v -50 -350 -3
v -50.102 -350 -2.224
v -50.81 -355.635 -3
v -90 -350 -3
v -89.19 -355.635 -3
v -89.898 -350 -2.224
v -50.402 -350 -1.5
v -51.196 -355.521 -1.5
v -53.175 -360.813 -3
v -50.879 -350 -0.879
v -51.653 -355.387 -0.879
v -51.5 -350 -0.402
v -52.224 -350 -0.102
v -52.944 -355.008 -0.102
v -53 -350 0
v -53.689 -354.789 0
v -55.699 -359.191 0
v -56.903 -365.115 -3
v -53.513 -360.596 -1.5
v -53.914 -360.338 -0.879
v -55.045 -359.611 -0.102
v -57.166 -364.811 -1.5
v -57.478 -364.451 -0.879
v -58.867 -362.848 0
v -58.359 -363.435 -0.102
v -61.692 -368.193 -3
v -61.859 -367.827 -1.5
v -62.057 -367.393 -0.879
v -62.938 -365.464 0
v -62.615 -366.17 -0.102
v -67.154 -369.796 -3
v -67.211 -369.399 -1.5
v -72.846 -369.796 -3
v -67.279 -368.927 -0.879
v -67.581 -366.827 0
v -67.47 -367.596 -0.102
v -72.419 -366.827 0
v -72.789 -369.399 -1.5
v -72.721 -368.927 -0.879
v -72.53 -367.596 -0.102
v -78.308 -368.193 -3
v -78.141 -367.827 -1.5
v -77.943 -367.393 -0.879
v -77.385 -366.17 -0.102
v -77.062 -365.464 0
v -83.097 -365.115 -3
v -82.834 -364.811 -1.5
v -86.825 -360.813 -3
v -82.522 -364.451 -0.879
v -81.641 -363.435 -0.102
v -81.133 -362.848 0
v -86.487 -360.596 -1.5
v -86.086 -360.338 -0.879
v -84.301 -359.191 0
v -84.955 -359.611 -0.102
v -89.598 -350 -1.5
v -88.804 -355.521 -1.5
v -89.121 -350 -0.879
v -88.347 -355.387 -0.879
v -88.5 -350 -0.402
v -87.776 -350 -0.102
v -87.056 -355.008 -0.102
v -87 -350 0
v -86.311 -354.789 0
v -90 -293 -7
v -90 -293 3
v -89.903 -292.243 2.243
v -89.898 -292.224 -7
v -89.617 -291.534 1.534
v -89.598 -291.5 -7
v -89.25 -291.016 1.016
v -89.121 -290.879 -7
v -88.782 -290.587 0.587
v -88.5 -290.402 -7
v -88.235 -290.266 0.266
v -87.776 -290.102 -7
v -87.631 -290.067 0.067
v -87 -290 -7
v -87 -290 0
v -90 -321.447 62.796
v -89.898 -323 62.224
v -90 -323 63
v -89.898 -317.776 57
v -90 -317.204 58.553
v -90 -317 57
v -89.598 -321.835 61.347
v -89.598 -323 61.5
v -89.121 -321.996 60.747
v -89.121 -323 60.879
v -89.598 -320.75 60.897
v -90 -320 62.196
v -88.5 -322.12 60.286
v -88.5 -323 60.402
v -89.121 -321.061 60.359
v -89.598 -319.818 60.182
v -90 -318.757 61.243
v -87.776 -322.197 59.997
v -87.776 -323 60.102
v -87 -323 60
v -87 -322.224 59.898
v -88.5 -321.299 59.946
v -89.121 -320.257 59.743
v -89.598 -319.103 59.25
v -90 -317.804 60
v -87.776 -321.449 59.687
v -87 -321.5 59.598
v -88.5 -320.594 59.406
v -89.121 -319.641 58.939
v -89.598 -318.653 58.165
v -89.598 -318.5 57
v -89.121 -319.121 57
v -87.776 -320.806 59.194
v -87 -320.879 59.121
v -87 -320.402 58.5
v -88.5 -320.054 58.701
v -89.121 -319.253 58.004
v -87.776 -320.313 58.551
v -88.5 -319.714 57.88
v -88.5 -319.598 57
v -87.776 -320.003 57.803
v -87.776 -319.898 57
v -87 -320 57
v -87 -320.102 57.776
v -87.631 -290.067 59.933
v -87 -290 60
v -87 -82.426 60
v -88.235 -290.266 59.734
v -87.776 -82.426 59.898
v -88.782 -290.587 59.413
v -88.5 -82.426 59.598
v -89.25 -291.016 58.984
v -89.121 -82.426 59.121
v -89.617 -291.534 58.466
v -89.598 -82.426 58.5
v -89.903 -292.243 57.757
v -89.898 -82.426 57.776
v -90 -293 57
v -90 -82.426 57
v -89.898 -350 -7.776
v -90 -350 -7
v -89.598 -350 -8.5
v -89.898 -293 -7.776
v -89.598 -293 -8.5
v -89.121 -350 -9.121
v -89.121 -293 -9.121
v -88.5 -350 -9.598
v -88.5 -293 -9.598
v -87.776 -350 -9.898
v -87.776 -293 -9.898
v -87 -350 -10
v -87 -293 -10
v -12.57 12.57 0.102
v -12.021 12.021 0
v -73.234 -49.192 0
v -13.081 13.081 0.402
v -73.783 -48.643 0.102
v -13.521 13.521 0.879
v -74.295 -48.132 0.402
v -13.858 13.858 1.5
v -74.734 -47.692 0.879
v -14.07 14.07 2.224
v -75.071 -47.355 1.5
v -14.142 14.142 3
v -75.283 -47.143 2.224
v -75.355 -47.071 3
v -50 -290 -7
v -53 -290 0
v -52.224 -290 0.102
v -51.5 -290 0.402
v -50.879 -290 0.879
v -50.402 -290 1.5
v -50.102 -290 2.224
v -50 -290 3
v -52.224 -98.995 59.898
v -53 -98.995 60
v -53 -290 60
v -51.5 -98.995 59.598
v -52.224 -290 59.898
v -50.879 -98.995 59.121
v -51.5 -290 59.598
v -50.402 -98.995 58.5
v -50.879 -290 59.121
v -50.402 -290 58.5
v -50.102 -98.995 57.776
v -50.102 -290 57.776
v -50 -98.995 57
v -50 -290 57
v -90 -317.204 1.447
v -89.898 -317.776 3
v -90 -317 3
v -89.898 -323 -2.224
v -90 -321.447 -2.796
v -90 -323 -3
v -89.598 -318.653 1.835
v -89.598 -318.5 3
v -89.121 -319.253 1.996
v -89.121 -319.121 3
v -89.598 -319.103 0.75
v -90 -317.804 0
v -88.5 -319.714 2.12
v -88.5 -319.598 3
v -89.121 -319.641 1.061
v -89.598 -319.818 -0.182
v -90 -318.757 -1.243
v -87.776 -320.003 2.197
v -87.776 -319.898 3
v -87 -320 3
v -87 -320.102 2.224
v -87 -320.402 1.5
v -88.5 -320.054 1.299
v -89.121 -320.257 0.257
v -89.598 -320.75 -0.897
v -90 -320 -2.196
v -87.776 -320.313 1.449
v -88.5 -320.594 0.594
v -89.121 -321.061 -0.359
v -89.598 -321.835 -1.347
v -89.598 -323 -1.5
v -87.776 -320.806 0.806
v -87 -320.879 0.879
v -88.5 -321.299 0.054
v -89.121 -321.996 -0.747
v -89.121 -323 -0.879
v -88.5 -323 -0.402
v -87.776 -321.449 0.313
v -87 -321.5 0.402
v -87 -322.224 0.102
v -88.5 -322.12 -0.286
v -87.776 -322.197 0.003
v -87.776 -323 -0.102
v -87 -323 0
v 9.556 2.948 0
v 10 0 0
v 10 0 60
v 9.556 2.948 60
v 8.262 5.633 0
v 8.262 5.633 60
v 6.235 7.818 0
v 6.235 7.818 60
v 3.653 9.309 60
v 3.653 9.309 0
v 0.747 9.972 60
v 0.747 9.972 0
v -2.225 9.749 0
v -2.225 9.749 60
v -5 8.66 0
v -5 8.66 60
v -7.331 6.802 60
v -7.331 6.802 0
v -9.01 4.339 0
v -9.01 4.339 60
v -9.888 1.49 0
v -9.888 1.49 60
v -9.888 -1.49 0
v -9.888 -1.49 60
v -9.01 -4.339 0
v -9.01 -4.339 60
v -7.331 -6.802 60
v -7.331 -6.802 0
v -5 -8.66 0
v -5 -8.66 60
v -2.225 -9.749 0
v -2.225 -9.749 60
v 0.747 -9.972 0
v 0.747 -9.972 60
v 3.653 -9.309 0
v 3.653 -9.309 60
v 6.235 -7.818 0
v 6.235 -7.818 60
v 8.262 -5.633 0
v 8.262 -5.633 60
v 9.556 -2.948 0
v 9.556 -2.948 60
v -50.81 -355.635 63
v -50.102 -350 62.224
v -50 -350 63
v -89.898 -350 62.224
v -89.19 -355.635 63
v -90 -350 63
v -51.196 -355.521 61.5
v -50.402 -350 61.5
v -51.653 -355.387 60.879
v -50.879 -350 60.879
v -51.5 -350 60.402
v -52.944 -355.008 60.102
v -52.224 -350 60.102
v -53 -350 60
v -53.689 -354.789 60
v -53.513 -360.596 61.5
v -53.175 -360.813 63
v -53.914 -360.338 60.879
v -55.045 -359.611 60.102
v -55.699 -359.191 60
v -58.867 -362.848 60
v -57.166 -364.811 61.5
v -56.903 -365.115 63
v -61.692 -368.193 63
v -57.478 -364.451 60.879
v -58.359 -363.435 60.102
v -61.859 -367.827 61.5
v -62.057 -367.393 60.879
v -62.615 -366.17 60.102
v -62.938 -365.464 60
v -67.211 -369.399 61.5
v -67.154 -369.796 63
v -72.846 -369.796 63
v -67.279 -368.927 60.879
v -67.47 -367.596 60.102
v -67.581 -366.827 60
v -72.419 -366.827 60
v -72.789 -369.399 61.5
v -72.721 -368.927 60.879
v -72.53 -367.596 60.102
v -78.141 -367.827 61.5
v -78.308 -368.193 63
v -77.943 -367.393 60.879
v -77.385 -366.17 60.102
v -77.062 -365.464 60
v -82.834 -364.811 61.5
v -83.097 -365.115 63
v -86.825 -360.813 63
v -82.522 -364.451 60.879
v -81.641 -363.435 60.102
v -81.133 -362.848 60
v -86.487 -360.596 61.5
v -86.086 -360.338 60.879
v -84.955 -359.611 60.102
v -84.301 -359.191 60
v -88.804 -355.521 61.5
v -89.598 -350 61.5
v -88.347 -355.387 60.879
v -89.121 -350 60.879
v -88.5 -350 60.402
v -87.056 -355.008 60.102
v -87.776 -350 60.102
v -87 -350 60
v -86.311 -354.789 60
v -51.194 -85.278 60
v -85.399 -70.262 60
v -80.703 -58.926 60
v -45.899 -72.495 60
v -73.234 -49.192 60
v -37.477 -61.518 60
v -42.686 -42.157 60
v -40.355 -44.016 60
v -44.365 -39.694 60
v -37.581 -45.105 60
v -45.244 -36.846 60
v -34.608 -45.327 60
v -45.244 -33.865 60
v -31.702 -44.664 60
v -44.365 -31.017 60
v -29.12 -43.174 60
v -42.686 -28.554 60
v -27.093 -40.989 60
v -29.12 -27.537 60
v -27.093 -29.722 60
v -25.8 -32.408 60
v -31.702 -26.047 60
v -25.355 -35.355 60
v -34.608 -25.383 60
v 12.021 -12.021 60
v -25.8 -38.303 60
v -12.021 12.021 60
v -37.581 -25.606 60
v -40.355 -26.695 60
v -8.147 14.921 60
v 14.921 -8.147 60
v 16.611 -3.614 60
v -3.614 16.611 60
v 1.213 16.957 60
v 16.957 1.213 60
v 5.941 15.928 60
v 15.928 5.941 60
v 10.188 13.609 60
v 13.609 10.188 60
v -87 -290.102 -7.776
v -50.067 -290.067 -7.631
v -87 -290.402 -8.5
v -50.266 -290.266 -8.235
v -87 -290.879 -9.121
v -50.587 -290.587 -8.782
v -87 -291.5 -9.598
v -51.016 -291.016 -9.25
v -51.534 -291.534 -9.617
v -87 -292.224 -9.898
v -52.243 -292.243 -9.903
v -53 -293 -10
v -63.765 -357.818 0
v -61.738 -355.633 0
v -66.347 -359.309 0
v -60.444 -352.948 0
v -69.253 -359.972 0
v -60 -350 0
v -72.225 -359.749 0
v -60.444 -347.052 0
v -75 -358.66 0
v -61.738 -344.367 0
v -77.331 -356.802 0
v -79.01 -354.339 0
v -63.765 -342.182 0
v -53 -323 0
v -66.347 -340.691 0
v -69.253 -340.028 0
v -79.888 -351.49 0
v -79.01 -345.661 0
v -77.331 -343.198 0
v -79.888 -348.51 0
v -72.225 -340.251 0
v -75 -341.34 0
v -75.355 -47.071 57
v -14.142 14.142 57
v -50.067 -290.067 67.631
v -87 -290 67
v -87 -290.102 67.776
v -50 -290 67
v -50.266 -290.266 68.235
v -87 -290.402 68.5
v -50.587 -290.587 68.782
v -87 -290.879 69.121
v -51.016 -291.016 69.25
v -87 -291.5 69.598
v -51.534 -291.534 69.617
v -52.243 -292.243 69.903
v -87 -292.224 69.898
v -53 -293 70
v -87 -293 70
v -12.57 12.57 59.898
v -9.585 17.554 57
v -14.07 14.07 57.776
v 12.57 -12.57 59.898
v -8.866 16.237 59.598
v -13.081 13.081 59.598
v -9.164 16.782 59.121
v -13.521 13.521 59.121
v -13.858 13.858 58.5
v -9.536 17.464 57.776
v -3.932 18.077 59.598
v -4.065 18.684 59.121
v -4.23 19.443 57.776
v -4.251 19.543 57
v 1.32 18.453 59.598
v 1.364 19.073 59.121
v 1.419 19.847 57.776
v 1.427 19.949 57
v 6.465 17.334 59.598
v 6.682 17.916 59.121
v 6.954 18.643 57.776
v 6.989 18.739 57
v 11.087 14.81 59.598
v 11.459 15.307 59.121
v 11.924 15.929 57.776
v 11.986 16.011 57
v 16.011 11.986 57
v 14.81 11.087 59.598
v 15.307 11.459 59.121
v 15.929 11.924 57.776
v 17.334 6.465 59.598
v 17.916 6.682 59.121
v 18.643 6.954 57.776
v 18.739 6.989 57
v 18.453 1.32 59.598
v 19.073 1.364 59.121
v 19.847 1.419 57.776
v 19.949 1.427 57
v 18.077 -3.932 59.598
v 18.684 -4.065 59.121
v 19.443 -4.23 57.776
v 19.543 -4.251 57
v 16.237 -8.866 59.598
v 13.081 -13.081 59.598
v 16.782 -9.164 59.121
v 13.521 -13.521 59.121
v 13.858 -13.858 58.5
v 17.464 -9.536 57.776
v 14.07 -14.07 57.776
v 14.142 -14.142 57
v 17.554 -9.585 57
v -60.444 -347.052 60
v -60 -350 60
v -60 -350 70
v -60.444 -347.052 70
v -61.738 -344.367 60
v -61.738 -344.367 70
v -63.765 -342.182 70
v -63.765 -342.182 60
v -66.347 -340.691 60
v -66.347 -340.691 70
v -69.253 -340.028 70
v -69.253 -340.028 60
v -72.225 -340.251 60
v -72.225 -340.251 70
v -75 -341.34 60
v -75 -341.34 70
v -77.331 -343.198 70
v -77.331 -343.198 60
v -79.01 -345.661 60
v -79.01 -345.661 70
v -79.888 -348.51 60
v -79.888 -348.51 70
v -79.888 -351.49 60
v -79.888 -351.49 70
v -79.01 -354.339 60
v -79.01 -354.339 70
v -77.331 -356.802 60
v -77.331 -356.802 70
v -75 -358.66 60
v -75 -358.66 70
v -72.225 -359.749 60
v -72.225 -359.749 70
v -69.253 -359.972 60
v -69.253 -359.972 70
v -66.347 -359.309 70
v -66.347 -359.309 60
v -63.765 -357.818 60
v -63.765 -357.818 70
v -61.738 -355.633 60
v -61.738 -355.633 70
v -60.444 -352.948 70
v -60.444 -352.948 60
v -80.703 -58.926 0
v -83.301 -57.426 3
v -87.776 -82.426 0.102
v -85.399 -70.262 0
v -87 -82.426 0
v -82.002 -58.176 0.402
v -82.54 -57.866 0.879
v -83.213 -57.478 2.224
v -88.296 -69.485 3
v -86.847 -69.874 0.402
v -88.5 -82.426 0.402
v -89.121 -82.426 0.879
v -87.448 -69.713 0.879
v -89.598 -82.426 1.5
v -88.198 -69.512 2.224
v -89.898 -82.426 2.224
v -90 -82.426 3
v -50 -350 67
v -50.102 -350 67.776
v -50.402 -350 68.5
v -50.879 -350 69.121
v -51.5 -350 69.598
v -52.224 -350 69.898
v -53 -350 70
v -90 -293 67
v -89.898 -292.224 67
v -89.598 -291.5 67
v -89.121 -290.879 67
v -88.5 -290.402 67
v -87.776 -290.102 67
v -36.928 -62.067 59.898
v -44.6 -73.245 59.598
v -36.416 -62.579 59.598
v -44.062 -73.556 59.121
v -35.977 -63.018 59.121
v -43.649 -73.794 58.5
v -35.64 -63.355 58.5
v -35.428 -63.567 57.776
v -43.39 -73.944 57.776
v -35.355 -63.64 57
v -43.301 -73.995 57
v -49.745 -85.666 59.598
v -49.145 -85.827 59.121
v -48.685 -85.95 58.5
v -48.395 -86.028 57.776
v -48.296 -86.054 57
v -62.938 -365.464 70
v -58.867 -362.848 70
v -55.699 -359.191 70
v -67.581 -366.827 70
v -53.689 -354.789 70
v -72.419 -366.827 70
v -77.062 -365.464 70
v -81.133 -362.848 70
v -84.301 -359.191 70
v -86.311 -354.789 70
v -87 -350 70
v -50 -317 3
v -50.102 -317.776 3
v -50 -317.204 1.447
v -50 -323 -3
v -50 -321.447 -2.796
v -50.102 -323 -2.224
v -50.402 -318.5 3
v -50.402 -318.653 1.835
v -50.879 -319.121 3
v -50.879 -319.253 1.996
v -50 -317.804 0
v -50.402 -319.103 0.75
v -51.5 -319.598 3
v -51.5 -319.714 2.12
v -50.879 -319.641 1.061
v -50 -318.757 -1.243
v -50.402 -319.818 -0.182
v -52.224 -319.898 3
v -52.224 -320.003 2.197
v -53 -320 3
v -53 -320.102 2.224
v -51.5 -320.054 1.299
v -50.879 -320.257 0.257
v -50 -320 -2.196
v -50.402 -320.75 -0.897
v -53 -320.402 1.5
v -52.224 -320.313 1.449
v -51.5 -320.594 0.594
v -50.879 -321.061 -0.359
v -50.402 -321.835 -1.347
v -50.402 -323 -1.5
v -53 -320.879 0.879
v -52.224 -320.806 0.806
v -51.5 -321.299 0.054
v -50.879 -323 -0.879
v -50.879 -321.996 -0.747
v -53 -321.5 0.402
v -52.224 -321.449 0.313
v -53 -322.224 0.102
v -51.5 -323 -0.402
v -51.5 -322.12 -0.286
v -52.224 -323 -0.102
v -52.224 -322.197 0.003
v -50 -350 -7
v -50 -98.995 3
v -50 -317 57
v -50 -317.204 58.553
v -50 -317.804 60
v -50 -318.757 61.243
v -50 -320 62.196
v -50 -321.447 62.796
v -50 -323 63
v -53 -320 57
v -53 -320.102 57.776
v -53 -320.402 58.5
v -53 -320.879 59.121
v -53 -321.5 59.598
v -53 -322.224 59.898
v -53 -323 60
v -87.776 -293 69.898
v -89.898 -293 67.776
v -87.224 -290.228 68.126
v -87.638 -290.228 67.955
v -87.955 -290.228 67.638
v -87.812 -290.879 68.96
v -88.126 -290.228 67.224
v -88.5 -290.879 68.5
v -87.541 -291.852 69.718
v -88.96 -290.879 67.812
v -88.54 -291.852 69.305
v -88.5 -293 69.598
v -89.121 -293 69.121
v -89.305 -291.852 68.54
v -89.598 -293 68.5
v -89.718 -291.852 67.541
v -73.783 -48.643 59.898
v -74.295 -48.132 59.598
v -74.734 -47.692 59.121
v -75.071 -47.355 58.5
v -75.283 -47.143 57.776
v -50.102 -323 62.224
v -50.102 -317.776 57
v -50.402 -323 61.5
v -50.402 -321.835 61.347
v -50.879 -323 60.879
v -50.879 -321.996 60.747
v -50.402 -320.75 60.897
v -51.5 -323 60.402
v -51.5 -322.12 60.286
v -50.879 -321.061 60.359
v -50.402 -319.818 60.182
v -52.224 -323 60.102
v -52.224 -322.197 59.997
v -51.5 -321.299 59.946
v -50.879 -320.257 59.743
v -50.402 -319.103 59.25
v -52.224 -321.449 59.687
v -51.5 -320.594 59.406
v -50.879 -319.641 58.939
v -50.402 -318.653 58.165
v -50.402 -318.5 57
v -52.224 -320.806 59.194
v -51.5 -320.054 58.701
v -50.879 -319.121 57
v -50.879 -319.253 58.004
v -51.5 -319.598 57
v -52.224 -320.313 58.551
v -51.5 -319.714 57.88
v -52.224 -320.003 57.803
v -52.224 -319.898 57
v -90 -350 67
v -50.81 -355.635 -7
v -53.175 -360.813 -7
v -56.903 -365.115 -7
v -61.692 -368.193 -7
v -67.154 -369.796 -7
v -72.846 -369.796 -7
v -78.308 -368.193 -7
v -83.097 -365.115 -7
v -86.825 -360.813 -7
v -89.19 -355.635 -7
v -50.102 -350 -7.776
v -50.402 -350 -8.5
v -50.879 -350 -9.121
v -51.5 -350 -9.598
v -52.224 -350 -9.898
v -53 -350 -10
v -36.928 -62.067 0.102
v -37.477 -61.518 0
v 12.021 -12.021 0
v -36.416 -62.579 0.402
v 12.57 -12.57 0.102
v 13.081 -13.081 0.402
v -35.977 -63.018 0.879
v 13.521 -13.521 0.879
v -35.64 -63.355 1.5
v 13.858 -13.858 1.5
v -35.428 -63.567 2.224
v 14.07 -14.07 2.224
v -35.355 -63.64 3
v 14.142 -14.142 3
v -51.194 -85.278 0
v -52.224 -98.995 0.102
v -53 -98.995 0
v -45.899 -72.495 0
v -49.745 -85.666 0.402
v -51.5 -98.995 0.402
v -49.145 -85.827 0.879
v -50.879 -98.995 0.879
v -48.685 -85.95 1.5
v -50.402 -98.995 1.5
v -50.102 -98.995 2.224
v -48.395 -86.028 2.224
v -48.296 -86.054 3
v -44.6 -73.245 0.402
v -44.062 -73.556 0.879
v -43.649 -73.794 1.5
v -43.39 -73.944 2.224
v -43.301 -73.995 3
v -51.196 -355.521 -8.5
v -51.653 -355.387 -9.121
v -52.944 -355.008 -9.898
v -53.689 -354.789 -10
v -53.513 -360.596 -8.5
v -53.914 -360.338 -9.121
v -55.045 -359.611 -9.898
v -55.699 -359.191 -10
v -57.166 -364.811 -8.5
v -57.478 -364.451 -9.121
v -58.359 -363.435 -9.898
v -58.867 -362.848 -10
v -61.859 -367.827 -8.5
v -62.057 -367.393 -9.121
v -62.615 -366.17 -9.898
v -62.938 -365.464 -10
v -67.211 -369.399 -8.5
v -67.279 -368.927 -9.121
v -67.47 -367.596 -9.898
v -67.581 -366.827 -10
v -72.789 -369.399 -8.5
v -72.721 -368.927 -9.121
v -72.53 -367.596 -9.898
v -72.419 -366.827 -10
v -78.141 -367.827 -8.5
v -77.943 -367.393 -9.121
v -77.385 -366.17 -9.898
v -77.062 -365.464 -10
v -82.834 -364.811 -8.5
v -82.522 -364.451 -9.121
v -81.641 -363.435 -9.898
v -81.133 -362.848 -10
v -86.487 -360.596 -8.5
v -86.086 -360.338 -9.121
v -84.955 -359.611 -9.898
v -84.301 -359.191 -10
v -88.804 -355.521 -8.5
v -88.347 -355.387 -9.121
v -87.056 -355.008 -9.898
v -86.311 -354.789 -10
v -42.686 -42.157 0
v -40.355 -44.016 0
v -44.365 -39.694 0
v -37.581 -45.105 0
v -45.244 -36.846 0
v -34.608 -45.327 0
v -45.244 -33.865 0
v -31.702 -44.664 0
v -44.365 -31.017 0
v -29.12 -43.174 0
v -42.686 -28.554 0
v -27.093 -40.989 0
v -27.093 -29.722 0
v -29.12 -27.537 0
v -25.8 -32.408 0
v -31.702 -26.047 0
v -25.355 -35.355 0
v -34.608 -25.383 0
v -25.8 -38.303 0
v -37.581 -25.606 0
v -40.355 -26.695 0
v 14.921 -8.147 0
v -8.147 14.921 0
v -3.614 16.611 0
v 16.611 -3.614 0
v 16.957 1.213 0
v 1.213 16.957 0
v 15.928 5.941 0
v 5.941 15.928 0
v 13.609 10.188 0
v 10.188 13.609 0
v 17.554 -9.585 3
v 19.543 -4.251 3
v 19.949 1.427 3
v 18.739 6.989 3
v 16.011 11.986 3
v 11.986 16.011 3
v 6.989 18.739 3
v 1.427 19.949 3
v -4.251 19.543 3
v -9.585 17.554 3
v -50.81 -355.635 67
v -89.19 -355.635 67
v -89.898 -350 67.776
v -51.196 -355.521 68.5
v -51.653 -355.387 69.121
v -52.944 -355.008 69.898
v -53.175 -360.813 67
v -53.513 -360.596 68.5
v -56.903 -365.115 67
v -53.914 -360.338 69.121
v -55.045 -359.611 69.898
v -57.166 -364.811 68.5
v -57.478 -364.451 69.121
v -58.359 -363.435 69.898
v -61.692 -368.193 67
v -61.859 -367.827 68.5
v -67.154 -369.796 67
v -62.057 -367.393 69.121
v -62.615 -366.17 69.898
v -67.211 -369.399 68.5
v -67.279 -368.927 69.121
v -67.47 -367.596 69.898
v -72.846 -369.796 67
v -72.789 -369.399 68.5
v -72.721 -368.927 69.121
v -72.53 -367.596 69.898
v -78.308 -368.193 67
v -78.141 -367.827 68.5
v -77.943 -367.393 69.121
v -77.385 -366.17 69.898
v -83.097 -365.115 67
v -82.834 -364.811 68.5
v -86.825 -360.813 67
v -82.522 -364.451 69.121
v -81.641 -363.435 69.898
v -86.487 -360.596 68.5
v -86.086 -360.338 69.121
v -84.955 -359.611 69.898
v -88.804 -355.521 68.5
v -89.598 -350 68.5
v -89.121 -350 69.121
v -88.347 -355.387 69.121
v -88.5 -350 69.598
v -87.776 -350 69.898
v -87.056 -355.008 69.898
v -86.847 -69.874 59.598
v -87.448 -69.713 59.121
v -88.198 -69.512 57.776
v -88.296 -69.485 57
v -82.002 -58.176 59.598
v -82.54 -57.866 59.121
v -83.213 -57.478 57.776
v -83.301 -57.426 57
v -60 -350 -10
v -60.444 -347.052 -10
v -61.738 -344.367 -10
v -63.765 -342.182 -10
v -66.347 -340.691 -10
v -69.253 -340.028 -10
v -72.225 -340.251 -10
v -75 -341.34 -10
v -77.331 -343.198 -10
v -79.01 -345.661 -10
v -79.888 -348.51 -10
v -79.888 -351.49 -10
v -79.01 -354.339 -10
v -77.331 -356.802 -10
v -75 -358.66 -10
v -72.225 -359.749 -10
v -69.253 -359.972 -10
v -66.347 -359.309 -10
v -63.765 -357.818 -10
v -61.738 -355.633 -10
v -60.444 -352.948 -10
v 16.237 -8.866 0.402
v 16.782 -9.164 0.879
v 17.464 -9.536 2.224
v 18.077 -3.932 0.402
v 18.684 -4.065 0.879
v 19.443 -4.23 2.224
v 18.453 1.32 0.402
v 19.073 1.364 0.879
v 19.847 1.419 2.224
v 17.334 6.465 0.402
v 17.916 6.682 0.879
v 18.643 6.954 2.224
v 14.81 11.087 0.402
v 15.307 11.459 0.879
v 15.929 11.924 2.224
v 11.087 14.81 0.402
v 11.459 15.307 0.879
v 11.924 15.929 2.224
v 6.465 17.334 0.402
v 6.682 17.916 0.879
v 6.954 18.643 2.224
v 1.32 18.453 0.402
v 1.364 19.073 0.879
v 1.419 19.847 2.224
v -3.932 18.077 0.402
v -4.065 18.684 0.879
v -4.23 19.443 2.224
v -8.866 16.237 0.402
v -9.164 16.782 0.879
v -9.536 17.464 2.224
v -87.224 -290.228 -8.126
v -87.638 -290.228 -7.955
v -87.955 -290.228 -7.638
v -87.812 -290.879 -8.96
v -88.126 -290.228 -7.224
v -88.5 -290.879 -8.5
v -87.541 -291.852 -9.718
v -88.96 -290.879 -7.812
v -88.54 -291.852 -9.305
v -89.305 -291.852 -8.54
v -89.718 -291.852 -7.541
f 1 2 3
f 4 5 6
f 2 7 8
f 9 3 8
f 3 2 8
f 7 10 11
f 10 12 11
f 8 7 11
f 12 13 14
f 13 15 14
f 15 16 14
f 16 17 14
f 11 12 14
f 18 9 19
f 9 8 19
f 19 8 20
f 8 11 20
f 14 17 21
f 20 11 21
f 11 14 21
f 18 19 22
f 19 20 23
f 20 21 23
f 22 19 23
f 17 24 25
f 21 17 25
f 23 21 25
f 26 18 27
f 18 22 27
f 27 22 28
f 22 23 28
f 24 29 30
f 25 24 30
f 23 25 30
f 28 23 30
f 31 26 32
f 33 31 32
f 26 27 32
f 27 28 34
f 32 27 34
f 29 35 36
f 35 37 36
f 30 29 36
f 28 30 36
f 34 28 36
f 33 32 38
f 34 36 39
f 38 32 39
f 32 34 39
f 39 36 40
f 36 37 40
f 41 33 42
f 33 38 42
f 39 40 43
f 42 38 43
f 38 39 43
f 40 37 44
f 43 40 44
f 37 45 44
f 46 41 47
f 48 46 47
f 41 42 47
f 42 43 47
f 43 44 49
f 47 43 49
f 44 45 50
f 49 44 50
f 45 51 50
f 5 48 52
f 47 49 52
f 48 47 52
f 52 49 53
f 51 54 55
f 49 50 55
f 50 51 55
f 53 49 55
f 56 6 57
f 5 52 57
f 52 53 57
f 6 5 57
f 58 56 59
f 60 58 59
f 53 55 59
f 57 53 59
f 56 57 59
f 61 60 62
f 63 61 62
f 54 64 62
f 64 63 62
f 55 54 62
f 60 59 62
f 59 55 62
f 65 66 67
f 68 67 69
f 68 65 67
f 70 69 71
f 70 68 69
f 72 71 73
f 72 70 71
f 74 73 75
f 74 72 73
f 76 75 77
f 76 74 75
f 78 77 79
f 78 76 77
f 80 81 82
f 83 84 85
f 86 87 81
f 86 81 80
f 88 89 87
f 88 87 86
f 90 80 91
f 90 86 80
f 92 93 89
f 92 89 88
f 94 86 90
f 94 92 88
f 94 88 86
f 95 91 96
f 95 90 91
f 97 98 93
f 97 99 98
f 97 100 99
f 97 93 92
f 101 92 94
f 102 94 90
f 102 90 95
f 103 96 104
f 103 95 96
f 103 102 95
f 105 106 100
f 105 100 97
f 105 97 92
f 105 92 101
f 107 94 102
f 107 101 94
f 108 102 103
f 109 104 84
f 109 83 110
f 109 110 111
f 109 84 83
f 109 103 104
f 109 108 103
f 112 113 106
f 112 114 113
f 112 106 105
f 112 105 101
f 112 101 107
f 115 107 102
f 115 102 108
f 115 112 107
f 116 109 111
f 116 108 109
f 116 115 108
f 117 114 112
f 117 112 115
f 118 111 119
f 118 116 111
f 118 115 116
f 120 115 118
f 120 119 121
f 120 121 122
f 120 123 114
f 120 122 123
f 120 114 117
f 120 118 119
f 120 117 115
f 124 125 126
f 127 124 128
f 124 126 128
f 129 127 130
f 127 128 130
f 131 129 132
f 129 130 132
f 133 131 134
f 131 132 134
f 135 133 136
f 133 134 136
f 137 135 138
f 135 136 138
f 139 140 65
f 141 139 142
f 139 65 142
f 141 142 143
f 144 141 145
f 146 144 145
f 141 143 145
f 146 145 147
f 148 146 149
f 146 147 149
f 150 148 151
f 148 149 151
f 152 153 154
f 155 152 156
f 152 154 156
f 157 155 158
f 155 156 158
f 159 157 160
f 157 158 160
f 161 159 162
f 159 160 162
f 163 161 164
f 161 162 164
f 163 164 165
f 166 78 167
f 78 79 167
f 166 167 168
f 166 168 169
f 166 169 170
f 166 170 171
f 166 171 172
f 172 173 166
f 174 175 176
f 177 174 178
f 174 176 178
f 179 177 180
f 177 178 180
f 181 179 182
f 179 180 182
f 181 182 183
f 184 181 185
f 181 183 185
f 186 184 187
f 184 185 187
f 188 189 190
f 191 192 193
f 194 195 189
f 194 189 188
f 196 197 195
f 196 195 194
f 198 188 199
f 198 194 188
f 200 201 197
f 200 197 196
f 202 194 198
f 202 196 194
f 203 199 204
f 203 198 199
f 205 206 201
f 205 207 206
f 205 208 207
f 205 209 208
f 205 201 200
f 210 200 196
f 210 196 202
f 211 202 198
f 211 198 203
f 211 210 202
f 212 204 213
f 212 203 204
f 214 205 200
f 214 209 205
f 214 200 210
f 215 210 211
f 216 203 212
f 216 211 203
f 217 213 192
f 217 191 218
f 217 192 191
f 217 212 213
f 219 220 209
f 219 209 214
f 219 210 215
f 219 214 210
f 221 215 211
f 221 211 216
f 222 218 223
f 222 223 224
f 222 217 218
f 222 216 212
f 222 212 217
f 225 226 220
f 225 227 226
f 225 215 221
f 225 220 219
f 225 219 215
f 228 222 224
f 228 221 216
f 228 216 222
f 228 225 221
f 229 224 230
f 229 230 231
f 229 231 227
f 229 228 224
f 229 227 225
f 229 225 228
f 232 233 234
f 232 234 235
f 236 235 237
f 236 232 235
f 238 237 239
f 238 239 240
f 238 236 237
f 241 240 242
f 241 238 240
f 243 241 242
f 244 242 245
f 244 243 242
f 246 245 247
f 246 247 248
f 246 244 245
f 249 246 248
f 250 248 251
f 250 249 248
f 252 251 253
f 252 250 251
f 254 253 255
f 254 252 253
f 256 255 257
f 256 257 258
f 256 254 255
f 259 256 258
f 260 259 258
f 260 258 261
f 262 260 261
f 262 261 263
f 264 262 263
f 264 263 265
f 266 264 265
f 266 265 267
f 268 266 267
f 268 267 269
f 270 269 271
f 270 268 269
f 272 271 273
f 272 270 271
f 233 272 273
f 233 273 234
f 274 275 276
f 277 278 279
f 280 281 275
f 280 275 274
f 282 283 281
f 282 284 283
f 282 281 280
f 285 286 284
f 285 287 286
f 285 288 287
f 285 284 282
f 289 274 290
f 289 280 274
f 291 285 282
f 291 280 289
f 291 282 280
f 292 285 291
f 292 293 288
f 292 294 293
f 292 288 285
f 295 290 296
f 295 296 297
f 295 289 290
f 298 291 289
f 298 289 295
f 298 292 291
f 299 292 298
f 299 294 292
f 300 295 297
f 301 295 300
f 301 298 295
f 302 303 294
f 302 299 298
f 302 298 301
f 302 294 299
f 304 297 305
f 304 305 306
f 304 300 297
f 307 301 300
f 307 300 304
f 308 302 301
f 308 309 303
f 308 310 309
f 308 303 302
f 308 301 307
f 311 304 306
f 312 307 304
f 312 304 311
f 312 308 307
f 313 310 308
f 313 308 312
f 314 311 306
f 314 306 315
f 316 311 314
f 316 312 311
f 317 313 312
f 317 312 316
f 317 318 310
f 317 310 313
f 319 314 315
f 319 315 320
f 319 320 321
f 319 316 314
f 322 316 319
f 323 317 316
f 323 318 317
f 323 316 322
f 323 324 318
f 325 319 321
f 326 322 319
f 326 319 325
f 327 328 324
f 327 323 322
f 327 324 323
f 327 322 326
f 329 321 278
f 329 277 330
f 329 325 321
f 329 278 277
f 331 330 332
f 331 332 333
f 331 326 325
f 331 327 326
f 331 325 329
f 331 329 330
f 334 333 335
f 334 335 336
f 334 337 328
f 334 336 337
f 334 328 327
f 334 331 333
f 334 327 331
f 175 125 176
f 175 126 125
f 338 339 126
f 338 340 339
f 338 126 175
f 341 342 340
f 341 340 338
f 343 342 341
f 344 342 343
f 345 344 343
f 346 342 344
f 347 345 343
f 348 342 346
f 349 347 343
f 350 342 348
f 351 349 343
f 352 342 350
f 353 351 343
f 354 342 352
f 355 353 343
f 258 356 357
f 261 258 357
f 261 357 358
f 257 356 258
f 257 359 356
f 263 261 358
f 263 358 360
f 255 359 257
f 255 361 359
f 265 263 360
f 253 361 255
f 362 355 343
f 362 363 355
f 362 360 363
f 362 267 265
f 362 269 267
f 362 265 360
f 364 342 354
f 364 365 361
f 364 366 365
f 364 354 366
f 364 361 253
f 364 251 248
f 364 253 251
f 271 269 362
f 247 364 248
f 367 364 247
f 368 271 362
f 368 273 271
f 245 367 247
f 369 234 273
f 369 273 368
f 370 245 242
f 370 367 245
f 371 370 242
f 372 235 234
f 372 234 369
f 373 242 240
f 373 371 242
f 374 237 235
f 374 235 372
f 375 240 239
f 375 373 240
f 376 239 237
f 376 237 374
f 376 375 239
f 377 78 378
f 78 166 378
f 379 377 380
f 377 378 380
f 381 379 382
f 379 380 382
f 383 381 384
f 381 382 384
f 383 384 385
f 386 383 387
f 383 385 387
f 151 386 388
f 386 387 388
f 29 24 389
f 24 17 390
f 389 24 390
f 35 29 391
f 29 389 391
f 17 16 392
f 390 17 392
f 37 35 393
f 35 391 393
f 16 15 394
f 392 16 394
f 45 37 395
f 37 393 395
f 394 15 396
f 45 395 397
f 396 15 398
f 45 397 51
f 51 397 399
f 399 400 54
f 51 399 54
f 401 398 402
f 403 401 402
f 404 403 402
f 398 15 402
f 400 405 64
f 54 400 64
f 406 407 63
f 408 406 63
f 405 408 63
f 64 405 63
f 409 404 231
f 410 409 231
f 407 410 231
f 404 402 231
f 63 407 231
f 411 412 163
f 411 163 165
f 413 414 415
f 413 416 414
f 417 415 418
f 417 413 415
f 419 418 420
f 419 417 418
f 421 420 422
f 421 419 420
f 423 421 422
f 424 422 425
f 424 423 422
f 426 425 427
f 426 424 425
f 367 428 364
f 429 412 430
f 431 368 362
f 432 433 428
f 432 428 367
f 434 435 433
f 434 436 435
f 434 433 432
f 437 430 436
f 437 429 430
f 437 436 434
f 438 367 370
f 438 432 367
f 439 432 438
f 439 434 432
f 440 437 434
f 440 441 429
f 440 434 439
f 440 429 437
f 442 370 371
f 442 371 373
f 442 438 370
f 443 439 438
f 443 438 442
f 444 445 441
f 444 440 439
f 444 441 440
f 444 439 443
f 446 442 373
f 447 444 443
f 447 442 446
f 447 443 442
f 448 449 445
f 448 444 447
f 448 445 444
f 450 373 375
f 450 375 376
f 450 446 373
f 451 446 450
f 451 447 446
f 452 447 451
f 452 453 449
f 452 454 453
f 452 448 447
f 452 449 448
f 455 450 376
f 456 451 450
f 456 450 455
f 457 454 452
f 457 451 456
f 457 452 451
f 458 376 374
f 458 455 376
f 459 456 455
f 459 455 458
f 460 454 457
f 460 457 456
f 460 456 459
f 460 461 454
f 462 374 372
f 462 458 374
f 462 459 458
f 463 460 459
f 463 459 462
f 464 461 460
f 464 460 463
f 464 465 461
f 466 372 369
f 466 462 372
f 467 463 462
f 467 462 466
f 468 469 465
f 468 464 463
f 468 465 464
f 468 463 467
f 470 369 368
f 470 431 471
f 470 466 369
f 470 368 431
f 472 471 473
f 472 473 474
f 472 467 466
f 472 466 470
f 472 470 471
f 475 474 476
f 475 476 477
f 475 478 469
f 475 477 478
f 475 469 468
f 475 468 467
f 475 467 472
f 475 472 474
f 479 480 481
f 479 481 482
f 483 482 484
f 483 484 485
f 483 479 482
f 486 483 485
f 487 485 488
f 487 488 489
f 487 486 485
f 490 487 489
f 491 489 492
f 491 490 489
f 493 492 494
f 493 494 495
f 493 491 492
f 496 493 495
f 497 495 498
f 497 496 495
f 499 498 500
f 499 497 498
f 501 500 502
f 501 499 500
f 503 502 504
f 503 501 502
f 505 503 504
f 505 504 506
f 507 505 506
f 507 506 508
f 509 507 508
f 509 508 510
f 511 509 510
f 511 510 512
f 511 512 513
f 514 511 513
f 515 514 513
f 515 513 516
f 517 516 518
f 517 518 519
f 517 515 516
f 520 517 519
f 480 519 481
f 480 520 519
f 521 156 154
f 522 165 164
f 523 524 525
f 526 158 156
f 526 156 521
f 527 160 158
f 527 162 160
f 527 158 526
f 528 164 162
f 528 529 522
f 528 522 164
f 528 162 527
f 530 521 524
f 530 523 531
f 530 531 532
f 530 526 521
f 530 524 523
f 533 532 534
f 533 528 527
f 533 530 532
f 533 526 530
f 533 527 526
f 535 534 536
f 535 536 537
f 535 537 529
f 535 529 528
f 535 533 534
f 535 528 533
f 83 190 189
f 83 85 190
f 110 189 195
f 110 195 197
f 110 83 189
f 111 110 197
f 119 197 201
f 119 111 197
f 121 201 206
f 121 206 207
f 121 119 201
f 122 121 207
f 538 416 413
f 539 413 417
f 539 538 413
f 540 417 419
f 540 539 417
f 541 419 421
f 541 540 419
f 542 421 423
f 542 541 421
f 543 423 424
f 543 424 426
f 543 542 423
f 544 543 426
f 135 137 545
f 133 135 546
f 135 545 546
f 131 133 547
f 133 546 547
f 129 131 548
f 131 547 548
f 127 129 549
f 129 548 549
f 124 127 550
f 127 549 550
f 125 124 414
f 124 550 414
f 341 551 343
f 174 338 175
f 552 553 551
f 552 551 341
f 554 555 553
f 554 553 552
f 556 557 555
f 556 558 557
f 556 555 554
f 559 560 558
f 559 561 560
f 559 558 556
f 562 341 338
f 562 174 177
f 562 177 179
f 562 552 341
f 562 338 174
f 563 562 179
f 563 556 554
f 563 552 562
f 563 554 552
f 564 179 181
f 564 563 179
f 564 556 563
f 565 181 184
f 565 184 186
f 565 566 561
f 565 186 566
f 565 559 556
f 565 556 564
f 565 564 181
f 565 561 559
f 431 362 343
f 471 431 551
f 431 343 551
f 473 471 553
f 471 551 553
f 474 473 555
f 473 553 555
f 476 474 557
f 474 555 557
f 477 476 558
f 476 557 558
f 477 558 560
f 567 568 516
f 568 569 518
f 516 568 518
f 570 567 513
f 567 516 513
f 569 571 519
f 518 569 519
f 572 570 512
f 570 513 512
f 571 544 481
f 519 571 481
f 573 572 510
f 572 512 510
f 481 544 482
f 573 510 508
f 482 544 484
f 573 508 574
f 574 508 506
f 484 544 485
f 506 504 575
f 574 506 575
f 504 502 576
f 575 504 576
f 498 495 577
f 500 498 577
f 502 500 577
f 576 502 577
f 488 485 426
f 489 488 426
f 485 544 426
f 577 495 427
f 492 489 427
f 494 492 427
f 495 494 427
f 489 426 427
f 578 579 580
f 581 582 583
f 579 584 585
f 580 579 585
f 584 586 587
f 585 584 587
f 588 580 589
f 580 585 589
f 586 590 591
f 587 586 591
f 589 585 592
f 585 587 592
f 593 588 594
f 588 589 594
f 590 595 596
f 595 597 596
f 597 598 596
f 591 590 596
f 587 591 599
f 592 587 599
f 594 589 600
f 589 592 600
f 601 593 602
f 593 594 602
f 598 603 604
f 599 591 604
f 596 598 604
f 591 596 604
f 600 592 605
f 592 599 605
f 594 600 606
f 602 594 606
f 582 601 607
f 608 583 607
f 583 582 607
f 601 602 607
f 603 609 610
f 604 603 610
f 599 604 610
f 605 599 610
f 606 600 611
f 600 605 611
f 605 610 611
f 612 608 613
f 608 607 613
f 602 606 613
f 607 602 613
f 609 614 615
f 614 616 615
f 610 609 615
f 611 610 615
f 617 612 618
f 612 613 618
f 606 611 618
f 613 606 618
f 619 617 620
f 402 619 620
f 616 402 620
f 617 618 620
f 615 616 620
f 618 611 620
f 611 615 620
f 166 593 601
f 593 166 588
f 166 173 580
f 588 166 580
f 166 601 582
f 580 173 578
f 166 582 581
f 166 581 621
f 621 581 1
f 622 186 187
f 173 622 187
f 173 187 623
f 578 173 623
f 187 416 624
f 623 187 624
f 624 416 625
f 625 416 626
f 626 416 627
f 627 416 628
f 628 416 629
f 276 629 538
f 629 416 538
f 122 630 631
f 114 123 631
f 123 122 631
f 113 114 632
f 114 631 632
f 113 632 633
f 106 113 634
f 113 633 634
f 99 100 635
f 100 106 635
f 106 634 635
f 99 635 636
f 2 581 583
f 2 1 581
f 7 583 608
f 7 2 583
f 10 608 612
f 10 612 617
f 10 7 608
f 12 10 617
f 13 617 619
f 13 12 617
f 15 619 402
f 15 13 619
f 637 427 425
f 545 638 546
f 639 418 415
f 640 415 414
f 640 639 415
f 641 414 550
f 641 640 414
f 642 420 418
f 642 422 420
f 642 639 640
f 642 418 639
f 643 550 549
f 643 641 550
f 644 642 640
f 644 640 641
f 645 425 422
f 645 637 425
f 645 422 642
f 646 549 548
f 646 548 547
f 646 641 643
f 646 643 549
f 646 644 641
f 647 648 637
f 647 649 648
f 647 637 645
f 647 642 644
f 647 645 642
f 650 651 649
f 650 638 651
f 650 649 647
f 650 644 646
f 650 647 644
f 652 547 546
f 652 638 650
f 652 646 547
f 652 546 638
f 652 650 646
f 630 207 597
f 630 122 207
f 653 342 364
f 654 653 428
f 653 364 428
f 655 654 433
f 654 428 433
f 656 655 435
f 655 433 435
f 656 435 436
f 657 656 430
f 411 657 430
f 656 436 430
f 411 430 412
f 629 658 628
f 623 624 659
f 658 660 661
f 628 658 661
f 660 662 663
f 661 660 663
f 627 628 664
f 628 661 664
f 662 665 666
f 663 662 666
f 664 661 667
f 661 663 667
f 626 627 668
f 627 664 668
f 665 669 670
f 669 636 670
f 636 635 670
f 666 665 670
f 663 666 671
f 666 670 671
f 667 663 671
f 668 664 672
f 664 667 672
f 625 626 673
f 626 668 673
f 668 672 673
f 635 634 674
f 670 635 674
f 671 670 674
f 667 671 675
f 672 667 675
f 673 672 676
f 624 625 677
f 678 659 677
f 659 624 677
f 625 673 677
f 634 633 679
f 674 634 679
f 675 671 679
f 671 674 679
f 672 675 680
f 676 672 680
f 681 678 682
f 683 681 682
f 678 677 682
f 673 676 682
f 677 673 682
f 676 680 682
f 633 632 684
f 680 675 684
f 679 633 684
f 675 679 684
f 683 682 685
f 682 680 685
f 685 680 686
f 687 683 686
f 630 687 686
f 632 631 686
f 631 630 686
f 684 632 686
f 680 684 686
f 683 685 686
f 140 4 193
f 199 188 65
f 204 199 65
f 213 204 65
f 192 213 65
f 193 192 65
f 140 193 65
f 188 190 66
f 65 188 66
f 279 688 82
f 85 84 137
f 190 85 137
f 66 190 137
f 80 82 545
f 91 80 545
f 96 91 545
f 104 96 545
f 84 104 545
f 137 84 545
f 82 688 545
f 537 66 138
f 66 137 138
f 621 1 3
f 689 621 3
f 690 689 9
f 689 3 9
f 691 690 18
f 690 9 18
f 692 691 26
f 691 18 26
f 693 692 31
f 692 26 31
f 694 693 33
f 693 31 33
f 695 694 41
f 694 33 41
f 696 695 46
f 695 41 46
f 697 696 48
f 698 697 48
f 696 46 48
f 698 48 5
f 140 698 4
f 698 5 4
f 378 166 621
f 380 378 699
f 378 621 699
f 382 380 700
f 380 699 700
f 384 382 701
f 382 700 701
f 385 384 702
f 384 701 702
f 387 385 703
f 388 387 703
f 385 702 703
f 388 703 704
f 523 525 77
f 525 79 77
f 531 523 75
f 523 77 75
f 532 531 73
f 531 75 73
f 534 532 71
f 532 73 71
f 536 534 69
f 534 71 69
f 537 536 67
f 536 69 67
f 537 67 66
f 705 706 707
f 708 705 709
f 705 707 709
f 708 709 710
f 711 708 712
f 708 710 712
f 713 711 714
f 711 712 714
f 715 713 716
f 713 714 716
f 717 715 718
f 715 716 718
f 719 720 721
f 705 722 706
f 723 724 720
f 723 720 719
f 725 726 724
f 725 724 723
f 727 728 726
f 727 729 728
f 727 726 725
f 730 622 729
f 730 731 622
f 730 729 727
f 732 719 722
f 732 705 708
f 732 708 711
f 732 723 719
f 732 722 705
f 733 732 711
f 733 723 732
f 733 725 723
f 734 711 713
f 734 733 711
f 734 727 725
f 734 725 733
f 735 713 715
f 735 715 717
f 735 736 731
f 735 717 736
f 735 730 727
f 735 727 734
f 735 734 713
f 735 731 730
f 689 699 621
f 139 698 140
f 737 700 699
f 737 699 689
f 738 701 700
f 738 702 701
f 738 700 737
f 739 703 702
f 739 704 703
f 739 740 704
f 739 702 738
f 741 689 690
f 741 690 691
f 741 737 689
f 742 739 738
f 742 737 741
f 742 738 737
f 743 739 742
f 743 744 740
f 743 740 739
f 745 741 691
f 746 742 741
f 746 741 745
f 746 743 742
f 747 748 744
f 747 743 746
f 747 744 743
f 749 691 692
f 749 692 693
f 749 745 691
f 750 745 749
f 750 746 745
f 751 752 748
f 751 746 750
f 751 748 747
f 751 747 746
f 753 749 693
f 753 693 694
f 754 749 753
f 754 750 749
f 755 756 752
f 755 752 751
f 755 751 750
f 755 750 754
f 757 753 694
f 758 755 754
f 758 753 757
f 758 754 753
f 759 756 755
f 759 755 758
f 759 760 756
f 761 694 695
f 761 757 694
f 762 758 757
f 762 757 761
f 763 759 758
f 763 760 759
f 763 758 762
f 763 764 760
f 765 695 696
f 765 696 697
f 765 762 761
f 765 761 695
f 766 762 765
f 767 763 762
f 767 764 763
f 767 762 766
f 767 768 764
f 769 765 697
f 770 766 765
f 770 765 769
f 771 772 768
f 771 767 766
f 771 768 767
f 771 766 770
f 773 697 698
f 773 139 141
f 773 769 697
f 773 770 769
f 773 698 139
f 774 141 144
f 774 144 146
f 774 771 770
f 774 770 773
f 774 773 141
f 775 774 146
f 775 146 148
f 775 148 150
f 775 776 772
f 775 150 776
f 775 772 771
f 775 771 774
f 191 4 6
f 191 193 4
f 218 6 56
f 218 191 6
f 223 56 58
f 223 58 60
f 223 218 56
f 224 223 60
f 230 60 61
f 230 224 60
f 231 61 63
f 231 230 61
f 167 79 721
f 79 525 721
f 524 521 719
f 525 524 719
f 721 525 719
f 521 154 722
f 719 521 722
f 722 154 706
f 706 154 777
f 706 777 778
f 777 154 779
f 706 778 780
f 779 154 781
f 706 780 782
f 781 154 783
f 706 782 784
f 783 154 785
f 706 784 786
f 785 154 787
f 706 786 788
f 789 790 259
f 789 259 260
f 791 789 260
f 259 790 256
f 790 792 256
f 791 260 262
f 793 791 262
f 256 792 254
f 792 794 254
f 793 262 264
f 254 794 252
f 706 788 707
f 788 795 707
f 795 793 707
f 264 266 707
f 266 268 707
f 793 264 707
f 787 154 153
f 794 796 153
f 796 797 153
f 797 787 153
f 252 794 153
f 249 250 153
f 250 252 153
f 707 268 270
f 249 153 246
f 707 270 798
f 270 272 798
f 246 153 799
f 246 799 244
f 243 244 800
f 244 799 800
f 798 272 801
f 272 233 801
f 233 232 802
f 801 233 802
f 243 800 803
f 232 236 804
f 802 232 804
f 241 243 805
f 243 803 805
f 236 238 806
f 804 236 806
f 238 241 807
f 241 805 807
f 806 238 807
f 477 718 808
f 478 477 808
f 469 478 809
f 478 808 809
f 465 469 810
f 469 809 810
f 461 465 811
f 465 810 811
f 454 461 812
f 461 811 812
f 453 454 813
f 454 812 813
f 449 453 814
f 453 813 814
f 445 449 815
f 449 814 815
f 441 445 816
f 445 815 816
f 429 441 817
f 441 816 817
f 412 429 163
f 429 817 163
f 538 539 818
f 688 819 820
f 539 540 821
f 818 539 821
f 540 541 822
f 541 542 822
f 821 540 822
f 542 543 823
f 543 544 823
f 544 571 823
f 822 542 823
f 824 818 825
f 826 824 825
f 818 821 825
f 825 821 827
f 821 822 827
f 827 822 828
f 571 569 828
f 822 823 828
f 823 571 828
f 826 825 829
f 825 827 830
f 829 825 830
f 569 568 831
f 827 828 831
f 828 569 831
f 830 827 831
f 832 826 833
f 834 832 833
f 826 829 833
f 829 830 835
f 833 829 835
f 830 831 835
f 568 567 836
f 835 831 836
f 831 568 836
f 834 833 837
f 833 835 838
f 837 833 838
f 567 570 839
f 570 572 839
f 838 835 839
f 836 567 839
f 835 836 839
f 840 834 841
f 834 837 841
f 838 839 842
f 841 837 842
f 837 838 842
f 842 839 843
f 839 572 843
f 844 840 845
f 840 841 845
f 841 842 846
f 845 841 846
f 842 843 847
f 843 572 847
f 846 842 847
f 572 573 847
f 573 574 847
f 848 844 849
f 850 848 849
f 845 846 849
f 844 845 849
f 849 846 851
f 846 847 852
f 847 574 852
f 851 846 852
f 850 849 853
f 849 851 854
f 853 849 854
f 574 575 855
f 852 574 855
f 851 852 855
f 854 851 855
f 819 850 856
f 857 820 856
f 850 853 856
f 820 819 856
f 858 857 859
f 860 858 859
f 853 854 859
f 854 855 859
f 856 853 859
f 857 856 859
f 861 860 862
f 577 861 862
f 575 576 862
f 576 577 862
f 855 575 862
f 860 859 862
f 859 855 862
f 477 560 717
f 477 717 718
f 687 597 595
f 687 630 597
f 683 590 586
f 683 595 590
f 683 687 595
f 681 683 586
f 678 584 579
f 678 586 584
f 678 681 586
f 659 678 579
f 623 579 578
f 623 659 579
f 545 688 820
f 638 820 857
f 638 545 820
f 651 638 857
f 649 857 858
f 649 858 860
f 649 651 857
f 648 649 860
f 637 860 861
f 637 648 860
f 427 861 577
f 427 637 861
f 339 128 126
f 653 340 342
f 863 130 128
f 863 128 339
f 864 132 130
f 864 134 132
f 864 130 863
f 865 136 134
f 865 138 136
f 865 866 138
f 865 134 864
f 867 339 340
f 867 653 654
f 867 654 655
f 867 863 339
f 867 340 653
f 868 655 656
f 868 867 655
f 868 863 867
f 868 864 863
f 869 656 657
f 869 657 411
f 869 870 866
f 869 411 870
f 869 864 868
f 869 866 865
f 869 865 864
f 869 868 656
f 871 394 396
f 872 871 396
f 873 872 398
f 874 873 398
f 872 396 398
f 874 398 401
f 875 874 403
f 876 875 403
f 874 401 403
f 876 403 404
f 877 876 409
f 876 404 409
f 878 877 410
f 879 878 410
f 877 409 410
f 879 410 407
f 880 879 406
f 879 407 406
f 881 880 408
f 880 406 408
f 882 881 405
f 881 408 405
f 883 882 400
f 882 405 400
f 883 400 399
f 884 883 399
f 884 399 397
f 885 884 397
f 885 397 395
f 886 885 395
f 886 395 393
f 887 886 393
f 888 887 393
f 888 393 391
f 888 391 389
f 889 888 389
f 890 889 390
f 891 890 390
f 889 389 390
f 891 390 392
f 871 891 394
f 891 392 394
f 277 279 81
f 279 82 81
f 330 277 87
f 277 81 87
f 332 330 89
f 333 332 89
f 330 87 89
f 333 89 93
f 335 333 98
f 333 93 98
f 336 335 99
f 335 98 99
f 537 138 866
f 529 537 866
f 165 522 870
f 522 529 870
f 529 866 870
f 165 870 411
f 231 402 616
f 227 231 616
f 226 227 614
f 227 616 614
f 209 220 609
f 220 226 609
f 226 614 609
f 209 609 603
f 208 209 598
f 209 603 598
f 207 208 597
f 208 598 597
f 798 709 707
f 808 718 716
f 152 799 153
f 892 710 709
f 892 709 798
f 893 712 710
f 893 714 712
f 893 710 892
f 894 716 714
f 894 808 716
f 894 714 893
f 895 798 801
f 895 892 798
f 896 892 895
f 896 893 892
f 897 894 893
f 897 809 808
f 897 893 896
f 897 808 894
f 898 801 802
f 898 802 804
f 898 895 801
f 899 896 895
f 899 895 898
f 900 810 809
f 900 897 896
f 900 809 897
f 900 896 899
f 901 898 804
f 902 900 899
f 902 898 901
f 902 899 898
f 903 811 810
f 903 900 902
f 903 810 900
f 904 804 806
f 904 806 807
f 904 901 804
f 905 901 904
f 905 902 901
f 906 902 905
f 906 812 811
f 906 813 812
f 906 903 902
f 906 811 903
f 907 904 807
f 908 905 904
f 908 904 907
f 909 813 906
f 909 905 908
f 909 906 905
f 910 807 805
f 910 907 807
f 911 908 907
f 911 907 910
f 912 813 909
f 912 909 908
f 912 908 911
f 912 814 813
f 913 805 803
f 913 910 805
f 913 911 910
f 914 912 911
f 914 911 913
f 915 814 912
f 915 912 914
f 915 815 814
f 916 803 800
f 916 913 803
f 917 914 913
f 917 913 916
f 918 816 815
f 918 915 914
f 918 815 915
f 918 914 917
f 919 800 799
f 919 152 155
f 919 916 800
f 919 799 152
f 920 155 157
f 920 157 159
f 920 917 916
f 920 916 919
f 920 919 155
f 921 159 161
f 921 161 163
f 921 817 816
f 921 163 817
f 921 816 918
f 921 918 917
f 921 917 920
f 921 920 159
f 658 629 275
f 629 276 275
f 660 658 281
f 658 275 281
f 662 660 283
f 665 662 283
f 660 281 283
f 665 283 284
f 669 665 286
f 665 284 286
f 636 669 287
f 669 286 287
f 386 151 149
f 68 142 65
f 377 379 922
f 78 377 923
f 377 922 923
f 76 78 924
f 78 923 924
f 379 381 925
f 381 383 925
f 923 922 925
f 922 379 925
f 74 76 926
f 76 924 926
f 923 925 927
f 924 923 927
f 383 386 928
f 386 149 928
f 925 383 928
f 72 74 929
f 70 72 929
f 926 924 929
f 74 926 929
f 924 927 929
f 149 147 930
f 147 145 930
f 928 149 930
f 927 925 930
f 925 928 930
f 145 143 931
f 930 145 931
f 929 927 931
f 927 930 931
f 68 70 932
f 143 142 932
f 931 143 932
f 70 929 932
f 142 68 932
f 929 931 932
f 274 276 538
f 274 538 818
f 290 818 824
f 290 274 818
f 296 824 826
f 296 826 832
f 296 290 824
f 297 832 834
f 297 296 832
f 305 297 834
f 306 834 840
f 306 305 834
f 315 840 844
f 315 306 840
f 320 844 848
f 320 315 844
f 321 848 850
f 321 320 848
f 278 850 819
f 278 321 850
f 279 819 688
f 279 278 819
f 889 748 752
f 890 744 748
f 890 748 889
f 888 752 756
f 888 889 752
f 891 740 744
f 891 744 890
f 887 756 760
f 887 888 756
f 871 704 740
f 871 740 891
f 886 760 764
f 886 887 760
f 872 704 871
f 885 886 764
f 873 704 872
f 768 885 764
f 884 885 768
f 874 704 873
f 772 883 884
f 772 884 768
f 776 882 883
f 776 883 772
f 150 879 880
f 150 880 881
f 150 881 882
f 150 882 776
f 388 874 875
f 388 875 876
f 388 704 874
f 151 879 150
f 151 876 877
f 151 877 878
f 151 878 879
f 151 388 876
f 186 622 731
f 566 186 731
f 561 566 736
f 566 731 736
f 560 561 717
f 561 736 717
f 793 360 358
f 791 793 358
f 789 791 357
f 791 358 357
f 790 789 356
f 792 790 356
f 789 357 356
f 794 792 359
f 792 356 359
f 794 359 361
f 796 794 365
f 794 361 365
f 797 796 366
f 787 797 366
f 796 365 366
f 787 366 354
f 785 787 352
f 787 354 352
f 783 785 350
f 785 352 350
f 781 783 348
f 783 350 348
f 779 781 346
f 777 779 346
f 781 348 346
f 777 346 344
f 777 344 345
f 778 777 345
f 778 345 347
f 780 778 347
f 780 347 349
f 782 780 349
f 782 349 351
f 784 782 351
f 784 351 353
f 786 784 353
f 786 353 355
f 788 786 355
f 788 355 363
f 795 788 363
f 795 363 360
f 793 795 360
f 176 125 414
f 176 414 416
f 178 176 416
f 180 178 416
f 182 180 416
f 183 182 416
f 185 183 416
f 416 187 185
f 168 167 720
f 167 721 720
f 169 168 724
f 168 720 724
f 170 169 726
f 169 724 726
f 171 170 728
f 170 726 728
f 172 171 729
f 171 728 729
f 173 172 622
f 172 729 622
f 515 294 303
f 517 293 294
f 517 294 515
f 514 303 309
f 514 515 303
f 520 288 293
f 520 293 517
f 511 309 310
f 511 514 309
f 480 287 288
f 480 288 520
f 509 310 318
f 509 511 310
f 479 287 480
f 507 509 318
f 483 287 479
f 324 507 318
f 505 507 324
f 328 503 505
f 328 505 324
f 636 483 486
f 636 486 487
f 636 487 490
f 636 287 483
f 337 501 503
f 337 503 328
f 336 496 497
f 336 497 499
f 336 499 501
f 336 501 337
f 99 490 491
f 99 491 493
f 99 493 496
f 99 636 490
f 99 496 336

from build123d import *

# Parameters (mm, degrees)
SKETCH_1_R          = 20
SKETCH_1_R_2        = 10
EXTRUDE_1_DEPTH     = 60
EXTRUDE_2_DEPTH     = 30
SKETCH_4_R          = 10
EXTRUDE_3_DEPTH     = 10
SKETCH_8_R          = 10
CUT_EXTRUDE_1_DEPTH = 100
FILLET_1_R          = 50
FILLET_2_R          = 3


with BuildPart() as part:
    # 草图1 → 凸台-拉伸1 (new body)
    with BuildSketch(Plane.XY):
        Circle(SKETCH_1_R)
        Circle(SKETCH_1_R_2, mode=Mode.SUBTRACT)
    extrude(amount=EXTRUDE_1_DEPTH)

    # 草图2 → 凸台-拉伸2 (add, symmetric)
    with BuildSketch(Plane.XY.offset(30)):
        with BuildLine():
            Line((-14.142135624, 14.142135624), (-90, -61.715728753))
            Line((-90, -61.715728753), (-90, -320))
            Line((-90, -320), (-50, -320))
            Line((-50, -320), (-50, -78.284271247))
            Line((-50, -78.284271247), (14.142135624, -14.142135624))
            ThreePointArc((14.142135624, -14.142135624), (-14.142135624, -14.142135624), (-14.142135624, 14.142135624))
        make_face()
    extrude(amount=EXTRUDE_2_DEPTH, both=True)

    # 草图4 → 凸台-拉伸3 (add)
    with BuildSketch(Plane.XY.offset(60)):
        with BuildLine():
            Line((-90, -290), (-50, -290))
            Line((-50, -290), (-50, -350))
            ThreePointArc((-50, -350), (-70, -370), (-90, -350))
            Line((-90, -350), (-90, -290))
        make_face()
        with Locations((-70, -350)):
            Circle(SKETCH_4_R, mode=Mode.SUBTRACT)
    extrude_3 = extrude(amount=EXTRUDE_3_DEPTH)

    # 镜向1: 凸台-拉伸3 across plane
    add(extrude_3.mirror(Plane.XY.offset(30)))

    # 草图8 → 切除-拉伸1 (cut)
    with BuildSketch(Plane.XY.offset(60)):
        with Locations((-35.355339059, -35.355339059)):
            Circle(SKETCH_8_R)
    extrude(amount=-CUT_EXTRUDE_1_DEPTH, mode=Mode.SUBTRACT)

    # 圆角1
    fillet_1_edges = [part.edges().sort_by_distance(p)[0] for p in [
        (-50, -78.284271247, 30),
        (-90, -61.715728753, 30),
    ]]
    fillet(fillet_1_edges, radius=FILLET_1_R)

    # 圆角2
    fillet_2_edges = [part.edges().sort_by_distance(p)[0] for p in [
        (14.142135624, 14.142135624, 60),
        (14.142135624, 14.142135624, 0),
        (-10.606601718, -38.890872965, 60),
        (-44.748737342, -16.464466094, 0),
        (-70, -320, 0),
        (-90, -320, 30),
        (-50, -320, 30),
        (-44.748737342, -16.464466094, 60),
        (-70, -320, 60),
        (-10.606601718, -38.890872965, 0),
        (-90, -320, 70),
        (-70, -370, 70),
        (-50, -320, 70),
        (-70, -290, 70),
        (-90, -335, 60),
        (-90, -290, 65),
        (-70, -370, 60),
        (-50, -335, 60),
        (-90, -320, -10),
        (-70, -290, -10),
        (-90, -290, -5),
        (-50, -320, -10),
        (-70, -370, -10),
        (-90, -335, 0),
        (-70, -370, 0),
        (-50, -335, 0),
        (-90, -186.213203436, 0),
        (-90, -186.213203436, 60),
        (-50, -194.497474683, 0),
        (-86.193976626, -63.292235253, 0),
        (-50, -194.497474683, 60),
        (-86.193976626, -63.292235253, 60),
        (-46.193976626, -79.860777748, 0),
        (-46.193976626, -79.860777748, 60),
    ]]
    fillet(fillet_2_edges, radius=FILLET_2_R)


solid = part.part
